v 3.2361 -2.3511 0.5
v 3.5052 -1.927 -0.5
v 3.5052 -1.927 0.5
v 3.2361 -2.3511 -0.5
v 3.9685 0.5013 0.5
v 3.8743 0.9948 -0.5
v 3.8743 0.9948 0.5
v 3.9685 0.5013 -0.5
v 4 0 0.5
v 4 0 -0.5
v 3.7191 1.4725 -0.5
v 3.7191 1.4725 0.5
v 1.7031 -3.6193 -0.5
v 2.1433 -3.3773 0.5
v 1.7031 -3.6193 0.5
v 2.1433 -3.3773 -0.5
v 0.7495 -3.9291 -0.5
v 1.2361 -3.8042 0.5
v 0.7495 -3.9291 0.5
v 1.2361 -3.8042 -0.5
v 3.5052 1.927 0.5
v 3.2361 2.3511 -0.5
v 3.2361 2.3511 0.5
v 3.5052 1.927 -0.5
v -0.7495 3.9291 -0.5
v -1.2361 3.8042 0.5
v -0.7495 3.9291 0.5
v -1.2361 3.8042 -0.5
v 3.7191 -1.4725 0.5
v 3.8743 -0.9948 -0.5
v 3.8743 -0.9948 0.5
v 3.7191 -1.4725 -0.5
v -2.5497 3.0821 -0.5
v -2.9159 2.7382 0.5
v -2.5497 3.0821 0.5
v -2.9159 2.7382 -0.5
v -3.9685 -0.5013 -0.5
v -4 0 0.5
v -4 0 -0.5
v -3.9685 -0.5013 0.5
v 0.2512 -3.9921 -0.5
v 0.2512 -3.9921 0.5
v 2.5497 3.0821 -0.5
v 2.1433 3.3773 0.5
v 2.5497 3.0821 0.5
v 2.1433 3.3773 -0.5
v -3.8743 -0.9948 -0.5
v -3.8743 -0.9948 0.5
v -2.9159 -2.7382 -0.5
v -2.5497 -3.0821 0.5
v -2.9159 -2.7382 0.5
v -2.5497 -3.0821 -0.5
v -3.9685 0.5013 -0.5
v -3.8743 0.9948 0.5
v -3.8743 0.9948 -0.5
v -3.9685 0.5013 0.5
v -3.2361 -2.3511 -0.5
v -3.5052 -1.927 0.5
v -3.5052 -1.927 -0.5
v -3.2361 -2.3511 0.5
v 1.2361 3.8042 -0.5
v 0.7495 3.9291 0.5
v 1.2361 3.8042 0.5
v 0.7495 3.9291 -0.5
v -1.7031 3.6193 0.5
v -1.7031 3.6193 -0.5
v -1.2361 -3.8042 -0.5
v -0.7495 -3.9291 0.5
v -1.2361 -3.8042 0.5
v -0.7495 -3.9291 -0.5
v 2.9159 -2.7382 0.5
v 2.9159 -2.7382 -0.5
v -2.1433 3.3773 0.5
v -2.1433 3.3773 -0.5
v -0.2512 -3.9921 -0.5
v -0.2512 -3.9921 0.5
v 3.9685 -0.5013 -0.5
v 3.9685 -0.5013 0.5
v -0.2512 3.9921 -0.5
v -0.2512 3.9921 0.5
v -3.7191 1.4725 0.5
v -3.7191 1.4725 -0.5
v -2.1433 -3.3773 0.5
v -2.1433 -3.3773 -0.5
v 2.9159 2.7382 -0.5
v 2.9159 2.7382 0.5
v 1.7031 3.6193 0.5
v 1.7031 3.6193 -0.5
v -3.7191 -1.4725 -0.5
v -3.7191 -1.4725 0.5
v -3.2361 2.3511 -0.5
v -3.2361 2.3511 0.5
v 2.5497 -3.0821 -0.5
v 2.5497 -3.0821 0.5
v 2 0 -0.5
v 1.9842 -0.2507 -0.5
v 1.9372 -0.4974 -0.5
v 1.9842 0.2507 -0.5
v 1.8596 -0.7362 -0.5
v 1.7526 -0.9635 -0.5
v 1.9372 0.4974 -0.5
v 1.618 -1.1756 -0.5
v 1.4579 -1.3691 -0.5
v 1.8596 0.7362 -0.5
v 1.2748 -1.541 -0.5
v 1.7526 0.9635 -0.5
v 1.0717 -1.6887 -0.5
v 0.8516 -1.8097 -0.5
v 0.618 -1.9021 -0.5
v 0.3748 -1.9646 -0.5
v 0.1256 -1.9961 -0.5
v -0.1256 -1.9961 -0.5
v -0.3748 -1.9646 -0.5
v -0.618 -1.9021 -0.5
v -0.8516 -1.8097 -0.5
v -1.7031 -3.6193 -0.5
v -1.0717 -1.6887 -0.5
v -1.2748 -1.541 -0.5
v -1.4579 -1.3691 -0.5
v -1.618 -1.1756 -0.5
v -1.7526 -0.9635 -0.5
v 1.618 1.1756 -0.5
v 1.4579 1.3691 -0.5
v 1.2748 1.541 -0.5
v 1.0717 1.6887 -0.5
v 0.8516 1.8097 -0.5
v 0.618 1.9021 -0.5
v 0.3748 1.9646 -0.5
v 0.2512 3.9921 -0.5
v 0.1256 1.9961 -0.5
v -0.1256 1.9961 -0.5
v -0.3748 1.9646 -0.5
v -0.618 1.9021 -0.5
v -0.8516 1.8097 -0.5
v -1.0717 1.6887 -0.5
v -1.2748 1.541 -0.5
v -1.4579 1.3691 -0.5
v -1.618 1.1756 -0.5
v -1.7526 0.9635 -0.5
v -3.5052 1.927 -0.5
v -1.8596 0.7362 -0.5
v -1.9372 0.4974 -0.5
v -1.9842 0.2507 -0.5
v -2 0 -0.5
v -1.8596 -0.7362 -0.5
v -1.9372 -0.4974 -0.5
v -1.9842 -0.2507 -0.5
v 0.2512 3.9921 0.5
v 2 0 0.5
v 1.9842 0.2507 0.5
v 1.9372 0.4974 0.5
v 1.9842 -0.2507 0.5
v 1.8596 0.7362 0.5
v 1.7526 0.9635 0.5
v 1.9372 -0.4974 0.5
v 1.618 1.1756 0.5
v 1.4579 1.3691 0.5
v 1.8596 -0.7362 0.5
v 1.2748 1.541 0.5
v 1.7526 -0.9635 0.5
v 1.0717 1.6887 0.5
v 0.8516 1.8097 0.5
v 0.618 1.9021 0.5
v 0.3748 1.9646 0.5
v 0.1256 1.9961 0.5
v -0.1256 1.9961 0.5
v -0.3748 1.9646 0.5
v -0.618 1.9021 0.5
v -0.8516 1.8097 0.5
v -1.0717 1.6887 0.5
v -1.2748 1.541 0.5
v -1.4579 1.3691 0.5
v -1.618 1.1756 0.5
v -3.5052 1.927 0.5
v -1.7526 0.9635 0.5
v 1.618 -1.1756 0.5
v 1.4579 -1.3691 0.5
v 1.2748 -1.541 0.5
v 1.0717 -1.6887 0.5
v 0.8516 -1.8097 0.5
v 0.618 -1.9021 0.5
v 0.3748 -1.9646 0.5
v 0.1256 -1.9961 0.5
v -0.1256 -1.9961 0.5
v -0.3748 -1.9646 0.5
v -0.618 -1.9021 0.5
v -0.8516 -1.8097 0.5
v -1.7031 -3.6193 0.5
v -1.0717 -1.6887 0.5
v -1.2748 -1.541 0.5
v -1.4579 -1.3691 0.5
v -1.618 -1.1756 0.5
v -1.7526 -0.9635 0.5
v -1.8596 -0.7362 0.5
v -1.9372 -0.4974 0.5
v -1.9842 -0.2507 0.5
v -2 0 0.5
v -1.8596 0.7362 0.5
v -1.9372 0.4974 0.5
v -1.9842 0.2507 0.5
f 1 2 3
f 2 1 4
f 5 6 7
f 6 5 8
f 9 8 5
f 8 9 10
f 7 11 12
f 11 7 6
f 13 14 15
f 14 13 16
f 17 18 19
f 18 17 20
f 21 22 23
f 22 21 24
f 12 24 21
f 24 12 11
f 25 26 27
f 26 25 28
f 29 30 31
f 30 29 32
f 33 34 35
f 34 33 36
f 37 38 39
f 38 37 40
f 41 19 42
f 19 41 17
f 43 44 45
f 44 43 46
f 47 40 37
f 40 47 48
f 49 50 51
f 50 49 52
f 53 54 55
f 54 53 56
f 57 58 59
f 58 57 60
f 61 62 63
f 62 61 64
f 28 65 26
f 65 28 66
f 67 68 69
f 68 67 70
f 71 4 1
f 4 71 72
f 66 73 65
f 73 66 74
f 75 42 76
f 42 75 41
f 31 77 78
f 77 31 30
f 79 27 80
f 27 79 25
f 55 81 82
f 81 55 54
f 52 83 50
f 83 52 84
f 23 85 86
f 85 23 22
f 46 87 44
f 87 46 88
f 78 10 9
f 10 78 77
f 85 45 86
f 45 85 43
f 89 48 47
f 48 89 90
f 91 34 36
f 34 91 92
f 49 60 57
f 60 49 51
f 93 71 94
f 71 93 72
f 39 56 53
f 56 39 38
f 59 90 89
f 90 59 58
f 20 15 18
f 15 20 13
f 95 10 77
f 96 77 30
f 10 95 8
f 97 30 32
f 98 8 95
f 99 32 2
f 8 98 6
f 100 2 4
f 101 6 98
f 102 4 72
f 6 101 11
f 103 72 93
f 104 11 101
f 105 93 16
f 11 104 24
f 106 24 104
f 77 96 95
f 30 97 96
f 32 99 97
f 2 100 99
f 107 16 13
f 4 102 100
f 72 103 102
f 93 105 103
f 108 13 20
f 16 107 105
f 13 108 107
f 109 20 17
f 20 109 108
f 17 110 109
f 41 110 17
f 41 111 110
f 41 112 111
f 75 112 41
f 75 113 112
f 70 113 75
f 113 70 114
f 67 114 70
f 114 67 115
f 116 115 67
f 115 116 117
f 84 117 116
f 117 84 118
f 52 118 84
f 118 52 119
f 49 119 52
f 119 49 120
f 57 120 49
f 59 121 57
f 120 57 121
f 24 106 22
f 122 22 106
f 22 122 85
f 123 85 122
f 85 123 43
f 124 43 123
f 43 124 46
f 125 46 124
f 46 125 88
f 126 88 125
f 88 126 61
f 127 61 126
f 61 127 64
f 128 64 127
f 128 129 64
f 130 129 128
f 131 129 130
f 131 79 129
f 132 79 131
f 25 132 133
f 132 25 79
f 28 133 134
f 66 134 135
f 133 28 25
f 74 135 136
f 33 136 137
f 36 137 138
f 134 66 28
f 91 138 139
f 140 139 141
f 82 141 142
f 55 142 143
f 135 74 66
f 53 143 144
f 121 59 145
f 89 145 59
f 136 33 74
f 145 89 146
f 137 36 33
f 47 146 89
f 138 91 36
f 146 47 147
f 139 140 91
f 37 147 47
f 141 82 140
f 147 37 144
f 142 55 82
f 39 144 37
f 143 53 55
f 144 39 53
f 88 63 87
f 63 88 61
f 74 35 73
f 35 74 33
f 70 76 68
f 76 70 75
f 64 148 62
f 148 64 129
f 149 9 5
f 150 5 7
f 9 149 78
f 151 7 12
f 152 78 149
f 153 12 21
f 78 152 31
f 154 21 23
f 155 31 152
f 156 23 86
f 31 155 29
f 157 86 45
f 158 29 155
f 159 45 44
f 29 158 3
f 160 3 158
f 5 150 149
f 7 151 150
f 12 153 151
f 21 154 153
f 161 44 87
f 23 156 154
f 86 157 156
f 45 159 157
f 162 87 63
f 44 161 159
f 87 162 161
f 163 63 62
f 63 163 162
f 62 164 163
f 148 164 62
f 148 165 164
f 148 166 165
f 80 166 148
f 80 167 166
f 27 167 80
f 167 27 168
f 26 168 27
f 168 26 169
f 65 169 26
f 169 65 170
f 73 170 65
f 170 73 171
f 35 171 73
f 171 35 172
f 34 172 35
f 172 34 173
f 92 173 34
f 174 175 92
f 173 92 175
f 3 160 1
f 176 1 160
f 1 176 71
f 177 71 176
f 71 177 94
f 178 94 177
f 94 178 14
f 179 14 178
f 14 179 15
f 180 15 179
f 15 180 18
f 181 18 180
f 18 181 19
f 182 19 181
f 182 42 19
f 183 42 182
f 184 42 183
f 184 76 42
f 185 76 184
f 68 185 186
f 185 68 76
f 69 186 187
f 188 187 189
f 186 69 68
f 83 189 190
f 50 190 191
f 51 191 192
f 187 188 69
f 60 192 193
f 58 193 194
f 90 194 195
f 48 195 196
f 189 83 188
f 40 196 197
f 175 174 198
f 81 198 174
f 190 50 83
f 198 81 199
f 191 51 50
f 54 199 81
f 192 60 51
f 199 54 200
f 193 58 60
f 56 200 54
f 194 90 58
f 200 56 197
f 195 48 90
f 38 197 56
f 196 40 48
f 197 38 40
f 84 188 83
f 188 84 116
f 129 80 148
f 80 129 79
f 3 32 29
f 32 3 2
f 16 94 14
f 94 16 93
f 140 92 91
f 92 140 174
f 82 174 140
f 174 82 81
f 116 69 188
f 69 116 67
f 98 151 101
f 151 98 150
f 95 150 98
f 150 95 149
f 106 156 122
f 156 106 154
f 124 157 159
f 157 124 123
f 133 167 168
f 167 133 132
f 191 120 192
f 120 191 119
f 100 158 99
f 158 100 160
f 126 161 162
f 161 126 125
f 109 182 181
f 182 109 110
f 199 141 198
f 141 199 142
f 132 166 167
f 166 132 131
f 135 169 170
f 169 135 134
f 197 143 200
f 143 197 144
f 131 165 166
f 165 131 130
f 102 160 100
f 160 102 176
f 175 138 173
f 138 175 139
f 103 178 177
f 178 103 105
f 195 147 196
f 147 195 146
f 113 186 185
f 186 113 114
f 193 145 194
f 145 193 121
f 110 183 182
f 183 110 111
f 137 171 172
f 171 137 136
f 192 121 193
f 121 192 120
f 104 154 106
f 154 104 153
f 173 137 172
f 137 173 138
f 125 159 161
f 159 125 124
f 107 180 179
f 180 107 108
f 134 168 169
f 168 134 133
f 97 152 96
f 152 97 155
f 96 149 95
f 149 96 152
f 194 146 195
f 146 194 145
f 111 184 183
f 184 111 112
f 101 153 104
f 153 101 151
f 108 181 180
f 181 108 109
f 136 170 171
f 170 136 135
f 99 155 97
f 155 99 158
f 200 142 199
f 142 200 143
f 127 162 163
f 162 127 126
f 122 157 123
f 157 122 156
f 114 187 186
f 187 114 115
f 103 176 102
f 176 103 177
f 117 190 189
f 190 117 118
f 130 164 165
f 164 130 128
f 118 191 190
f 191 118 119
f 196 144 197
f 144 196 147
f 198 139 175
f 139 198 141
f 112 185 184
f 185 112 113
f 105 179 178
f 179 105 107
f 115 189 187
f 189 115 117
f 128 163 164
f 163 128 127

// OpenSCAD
$fn = 50;


difference() {
	union() {
		translate(v = [0, 0, -0.5000000000]) {
			cylinder(h = 1, r = 4.0000000000);
		}
	}
	union() {
		translate(v = [0, 0, -100.0000000000]) {
			cylinder(h = 200, r = 2.0000000000);
		}
	}
}
